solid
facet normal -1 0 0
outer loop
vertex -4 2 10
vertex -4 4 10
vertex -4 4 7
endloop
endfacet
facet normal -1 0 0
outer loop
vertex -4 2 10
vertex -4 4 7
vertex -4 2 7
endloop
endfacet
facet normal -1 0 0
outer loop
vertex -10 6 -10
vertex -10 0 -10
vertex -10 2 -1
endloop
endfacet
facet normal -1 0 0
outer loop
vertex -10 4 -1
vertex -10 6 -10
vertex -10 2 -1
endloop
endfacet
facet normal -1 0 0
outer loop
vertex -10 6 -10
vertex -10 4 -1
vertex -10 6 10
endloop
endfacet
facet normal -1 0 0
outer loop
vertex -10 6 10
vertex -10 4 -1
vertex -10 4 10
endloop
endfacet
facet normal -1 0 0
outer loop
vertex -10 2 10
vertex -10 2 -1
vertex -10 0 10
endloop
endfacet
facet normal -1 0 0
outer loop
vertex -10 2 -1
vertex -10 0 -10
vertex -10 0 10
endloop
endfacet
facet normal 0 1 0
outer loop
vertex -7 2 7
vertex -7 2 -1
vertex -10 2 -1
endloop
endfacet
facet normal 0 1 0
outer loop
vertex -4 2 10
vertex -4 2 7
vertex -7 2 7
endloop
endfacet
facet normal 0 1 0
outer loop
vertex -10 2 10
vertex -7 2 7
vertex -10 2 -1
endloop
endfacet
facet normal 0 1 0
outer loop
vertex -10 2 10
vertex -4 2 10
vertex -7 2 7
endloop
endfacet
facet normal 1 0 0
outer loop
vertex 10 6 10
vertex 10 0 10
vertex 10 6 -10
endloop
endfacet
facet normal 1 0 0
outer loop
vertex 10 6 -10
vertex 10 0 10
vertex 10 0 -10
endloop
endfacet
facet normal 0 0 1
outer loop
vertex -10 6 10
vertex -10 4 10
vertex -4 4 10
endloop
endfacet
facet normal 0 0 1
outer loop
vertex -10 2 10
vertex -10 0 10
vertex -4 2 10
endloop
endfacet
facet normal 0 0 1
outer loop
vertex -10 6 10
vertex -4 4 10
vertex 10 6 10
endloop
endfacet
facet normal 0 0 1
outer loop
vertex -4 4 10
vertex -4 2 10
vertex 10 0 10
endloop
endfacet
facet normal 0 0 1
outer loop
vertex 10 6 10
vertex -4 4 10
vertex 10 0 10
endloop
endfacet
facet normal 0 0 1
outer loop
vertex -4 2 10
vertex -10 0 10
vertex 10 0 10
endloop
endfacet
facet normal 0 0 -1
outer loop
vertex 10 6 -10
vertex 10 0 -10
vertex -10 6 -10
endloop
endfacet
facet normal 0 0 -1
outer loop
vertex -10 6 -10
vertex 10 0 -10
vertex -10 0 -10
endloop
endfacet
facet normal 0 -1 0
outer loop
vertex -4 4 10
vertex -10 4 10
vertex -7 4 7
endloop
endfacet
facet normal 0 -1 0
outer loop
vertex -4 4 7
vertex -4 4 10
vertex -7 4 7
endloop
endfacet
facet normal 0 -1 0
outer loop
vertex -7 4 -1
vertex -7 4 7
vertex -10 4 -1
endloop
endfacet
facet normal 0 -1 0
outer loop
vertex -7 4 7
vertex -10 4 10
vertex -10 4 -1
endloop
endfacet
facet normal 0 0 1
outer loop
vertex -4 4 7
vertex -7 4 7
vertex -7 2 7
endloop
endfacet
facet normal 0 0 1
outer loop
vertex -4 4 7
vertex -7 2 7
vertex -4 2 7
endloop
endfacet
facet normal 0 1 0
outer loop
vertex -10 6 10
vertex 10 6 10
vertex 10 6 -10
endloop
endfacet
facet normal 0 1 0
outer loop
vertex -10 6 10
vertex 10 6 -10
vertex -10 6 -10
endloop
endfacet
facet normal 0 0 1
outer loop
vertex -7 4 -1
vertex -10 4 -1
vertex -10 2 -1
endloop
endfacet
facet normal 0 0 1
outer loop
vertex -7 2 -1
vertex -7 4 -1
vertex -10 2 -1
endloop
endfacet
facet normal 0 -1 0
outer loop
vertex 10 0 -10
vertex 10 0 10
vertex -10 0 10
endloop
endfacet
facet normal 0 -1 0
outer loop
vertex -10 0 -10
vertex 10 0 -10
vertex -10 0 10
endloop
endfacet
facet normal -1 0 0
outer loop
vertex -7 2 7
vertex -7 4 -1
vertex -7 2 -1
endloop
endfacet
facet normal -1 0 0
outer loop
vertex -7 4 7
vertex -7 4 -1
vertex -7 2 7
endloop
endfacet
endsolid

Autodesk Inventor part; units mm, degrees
ref_plane "YZ Plane" through (0, 0, 0) normal (1, 0, 0) x (0, 1, 0)
ref_plane "XZ Plane" through (0, 0, 0) normal (0, 1, 0) x (-1, 0, 0)
ref_plane "XY Plane" through (0, 0, 0) normal (0, 0, 1) x (1, 0, 0)
sketch "Sketch1" plane through (0, 0, 0) normal (0, 1, 0) x (-1, 0, 0)
  line L0 (10, 10) -> (-10, 10)
  line L1 (-10, 10) -> (-10, -10)
  line L2 (-10, -10) -> (10, -10)
  line L3 (10, -10) -> (10, 10)
  line L4 (10, 10) -> (-10, -10) construction
  line L5 (-10, 10) -> (10, -10) construction
  point P0 (0, 0)
  dimension "d0" = 20
  dimension "d1" = 20
extrude "Extrusion1" add sketch "Sketch1" along normal blind 6
sketch "Sketch2" plane through (-10, 0, 10) normal (0, 0, 1) x (1, 0, 0)
  line L0 (0, 0) -> (0, 6) projected
  line L1 (0, 4) -> (6, 4)
  line L2 (6, 4) -> (6, 2)
  line L3 (6, 2) -> (0, 2)
  line L4 (0, 2) -> (0, 4)
  line L5 (0, 0) -> (20, 0) projected
  point P0 (10, 0)
  point P1 (0, 2)
  dimension "d4" = 6
  dimension "d5" = 2
  dimension "d6" = 2
extrude "Extrusion2" cut sketch "Sketch2" against normal blind 3
sketch "Sketch3" plane through (-10, 0, -10) normal (-1, 0, 0) x (0, 0, 1)
  line L0 (20, 4) -> (17, 4) projected
  line L1 (20, 4) -> (9, 4)
  line L2 (9, 4) -> (9, 2)
  line L3 (9, 2) -> (20, 2)
  line L4 (20, 2) -> (20, 4)
  point P0 (10, 0)
  dimension "d9" = 11
  dimension "d10" = 2
extrude "Extrusion3" cut sketch "Sketch3" against normal blind 3
properties part number "Bracket Lifter Motor_3DPrint"
